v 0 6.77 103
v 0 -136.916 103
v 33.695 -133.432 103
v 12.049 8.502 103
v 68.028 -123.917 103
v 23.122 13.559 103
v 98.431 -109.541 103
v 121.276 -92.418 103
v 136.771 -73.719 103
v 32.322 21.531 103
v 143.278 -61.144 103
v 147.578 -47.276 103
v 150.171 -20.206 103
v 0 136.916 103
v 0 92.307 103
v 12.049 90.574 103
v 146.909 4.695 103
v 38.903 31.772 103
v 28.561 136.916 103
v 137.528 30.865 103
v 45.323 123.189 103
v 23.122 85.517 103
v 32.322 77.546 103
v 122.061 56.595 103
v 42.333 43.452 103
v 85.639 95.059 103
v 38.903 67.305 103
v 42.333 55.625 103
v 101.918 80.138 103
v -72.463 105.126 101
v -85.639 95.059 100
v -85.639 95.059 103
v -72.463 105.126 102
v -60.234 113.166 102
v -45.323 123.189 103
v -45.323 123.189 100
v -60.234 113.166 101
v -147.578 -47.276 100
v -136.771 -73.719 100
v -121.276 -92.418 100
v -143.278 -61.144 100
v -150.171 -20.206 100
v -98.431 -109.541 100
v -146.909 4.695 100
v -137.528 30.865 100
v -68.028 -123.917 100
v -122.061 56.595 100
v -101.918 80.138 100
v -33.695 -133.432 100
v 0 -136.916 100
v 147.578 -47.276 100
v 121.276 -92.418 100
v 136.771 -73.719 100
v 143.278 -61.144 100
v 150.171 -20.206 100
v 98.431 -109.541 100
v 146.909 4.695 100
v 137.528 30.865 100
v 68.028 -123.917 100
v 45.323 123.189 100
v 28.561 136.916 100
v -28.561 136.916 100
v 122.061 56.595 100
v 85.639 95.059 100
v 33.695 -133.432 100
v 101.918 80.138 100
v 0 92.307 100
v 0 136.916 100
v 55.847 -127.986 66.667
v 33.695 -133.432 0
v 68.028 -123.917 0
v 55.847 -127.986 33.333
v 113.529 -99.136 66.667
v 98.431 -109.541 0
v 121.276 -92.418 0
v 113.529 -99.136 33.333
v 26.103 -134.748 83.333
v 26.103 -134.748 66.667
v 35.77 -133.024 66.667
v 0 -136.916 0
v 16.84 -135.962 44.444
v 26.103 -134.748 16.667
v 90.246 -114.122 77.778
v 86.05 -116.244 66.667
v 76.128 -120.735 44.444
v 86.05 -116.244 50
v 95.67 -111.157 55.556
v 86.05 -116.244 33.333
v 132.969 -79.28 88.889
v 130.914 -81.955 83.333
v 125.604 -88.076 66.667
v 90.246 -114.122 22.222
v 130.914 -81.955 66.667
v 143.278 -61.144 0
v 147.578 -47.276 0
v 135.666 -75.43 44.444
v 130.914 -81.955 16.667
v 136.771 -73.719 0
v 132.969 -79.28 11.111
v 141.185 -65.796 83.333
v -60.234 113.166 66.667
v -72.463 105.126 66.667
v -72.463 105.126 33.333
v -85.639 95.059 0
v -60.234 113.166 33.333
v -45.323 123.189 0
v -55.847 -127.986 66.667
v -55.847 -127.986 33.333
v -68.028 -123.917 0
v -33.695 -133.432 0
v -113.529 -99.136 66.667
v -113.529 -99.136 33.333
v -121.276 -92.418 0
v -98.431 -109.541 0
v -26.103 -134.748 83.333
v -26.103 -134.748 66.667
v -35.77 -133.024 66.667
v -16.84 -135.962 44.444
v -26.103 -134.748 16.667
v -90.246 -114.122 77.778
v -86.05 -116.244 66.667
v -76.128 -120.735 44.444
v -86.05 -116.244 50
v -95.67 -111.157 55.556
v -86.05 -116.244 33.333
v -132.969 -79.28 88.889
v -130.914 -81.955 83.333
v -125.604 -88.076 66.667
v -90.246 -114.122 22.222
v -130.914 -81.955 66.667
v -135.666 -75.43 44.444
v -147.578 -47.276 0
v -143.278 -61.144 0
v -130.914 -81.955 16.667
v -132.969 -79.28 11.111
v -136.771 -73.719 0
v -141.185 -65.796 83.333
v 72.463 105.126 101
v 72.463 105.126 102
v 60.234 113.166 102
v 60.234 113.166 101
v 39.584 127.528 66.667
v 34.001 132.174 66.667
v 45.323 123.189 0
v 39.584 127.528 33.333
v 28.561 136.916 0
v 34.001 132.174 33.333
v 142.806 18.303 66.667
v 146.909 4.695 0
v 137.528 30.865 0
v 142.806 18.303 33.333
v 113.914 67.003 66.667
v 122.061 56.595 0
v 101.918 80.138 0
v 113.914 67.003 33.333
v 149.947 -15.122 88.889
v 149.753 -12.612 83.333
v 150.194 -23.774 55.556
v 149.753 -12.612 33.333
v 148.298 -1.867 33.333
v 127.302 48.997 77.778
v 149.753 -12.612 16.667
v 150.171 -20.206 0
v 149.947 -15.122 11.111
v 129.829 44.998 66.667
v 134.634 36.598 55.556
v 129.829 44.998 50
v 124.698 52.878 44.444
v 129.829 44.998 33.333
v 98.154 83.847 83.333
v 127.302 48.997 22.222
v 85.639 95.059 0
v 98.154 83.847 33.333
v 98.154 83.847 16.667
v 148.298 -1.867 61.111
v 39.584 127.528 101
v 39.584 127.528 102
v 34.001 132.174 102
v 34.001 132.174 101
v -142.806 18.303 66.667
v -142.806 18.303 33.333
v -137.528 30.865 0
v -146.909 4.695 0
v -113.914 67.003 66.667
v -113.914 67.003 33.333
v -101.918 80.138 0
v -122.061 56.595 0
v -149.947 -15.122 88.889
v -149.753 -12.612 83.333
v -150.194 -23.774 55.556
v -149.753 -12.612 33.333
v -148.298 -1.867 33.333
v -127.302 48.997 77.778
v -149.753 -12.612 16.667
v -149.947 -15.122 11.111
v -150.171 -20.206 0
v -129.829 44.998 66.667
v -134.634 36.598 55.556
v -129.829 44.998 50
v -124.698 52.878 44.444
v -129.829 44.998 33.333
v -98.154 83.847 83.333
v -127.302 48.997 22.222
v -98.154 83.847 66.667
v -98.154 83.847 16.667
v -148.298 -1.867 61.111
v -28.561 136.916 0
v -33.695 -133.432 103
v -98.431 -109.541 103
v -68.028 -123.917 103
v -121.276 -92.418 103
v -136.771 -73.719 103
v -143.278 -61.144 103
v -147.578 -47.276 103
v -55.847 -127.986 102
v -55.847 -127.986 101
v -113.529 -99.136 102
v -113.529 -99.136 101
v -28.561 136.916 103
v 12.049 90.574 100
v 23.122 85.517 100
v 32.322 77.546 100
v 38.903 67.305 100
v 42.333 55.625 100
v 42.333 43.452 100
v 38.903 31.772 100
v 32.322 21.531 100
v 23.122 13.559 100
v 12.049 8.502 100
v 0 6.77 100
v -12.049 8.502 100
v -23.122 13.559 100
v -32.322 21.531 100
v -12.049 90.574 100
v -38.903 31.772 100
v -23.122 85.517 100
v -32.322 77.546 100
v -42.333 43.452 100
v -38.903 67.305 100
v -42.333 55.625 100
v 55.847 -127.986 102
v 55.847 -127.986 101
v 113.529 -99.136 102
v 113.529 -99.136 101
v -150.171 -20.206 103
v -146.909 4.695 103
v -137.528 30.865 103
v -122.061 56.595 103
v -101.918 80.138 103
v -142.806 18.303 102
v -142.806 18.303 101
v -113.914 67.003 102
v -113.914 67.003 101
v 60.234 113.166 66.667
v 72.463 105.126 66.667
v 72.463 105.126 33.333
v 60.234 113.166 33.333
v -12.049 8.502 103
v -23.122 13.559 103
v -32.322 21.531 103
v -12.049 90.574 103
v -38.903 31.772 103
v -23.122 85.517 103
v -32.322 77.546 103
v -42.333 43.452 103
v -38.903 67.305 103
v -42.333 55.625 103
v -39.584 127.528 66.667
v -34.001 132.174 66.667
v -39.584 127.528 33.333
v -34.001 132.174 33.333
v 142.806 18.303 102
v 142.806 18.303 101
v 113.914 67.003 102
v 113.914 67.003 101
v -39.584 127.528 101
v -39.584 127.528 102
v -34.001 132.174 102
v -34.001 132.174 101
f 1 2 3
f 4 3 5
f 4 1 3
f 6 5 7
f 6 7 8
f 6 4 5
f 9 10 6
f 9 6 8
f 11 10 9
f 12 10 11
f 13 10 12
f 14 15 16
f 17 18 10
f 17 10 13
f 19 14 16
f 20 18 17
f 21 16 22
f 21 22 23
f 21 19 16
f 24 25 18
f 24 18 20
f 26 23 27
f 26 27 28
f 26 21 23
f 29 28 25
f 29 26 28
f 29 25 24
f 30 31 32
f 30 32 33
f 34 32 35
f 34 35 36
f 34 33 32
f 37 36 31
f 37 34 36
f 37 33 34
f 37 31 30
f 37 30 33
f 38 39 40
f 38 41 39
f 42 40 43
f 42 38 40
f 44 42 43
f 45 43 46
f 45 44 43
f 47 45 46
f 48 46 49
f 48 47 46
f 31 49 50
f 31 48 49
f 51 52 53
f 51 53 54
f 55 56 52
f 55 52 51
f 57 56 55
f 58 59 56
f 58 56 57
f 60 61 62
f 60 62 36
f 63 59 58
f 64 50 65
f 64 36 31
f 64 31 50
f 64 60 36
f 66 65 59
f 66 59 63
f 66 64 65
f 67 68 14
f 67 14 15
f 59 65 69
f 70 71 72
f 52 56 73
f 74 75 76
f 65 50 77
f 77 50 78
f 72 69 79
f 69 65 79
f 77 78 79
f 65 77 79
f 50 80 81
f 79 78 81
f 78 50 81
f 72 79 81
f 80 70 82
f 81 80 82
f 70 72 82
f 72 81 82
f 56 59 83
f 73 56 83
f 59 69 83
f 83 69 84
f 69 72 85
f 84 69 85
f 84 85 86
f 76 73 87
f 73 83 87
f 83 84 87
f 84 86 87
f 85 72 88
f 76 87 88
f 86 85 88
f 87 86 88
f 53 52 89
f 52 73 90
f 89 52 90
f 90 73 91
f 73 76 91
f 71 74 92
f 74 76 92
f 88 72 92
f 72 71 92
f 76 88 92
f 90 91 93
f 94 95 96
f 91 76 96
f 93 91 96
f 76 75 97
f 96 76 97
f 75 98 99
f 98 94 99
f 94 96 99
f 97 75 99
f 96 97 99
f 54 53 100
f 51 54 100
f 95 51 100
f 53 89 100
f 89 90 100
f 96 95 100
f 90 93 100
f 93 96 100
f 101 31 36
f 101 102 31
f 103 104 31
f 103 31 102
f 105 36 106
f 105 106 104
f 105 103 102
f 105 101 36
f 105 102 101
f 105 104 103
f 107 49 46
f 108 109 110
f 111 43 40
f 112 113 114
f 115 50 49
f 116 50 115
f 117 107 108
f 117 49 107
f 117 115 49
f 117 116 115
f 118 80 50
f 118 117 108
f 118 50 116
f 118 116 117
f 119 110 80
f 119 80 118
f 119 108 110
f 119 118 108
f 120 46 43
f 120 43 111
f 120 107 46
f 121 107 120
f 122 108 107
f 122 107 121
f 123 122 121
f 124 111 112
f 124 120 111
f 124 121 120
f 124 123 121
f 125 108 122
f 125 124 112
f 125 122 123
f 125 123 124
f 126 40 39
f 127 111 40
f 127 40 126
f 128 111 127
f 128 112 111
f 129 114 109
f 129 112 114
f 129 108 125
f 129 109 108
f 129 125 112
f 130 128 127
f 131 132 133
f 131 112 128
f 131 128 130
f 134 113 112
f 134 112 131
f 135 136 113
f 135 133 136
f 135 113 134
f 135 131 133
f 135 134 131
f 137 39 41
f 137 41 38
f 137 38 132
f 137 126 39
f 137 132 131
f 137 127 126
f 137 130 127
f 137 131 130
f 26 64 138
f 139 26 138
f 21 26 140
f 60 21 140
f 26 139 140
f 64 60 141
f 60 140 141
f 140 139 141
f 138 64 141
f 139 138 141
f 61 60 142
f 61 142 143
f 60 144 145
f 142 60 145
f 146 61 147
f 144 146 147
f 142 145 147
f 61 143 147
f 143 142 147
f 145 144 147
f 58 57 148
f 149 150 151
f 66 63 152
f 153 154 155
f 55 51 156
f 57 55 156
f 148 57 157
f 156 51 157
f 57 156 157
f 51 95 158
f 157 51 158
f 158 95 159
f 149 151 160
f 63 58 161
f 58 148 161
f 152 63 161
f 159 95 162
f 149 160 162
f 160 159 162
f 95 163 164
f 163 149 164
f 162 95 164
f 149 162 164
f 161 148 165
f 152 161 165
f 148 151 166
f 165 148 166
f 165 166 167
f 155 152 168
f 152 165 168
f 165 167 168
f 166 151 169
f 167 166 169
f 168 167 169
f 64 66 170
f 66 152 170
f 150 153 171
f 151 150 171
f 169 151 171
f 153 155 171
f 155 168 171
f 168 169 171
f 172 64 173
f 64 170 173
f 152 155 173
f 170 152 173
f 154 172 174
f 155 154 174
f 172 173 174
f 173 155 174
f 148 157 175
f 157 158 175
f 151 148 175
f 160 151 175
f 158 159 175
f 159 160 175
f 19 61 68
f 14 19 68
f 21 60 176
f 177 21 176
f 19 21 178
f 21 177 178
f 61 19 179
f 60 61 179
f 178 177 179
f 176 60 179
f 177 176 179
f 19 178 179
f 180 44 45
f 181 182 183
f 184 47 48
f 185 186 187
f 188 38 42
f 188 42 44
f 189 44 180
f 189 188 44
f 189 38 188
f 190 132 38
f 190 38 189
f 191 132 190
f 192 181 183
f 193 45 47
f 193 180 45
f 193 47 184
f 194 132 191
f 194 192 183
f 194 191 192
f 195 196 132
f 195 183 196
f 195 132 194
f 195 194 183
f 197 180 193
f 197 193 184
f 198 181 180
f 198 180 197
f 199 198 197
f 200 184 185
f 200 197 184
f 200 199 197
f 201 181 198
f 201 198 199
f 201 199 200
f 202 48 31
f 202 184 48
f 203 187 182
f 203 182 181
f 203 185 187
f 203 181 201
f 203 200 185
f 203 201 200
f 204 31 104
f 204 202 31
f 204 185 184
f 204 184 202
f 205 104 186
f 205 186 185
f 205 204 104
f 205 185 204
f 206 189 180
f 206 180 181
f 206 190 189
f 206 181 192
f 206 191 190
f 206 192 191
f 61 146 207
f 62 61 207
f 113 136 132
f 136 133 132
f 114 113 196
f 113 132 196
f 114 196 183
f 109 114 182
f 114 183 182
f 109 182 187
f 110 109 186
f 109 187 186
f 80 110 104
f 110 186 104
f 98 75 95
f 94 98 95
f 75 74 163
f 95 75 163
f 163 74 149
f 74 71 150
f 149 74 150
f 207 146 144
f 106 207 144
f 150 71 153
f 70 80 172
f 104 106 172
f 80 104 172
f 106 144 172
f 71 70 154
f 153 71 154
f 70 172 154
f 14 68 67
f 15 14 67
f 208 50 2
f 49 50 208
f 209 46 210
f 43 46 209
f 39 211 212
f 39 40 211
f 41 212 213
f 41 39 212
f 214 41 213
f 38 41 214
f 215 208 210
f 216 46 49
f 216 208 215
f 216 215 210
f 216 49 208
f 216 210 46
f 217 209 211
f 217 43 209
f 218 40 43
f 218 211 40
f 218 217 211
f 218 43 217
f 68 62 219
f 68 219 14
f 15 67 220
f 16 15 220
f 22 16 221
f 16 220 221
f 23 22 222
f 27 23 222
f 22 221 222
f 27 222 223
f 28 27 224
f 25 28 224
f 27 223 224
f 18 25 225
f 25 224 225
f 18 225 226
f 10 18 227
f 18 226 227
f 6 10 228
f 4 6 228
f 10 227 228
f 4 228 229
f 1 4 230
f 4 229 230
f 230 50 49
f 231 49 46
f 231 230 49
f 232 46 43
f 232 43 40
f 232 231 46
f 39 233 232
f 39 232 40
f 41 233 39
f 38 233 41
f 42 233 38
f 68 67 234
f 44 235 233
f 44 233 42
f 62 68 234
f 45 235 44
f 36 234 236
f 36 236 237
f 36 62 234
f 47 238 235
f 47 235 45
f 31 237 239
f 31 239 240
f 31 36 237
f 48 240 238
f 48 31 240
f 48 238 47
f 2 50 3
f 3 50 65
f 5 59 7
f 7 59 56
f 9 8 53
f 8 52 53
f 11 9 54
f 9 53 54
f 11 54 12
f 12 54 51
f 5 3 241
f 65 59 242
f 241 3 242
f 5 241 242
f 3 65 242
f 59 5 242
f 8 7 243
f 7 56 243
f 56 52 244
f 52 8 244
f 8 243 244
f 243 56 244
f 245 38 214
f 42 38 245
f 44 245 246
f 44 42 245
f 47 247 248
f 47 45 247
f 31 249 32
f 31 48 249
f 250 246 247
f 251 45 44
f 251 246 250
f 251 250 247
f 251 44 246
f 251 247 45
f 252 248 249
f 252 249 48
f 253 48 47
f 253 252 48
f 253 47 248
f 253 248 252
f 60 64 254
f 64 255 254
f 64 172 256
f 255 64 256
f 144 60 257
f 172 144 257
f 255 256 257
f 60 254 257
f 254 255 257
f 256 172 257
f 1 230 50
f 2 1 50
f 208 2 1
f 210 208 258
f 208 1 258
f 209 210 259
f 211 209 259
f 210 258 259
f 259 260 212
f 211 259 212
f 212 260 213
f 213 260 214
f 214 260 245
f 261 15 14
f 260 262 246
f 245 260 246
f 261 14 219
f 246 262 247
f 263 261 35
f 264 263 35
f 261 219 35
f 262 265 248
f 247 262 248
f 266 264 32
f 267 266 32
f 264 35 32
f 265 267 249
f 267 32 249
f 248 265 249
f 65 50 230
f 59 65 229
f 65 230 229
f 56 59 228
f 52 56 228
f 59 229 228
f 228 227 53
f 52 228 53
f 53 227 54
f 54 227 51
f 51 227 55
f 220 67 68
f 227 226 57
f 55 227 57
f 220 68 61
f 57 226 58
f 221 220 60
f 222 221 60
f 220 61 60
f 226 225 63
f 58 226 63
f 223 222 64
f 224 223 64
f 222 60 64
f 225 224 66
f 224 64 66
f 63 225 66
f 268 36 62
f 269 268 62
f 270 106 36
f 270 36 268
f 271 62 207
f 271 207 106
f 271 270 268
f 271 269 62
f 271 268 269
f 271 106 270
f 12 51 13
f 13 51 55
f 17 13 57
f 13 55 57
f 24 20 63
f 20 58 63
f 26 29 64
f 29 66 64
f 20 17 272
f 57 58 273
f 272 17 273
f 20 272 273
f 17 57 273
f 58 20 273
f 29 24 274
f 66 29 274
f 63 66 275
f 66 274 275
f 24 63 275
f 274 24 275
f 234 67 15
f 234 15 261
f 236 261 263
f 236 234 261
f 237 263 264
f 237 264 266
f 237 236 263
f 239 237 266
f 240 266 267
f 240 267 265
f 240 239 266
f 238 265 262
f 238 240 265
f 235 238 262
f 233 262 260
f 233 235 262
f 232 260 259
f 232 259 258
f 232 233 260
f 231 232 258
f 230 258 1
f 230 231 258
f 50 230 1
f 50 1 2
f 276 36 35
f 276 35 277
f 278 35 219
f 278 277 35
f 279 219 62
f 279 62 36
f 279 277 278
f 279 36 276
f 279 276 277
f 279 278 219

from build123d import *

# Parameters (mm, degrees)
SALIENTE_EXTRUIR1_DEPTH = 100
SALIENTE_EXTRUIR2_DEPTH = 100
SALIENTE_EXTRUIR6_DEPTH = 3
SALIENTE_EXTRUIR7_DEPTH = 3


with BuildPart() as part:
    # Croquis1 → Saliente-Extruir1 (new body)
    with BuildSketch(Plane.XY):
        with BuildLine():
            Line((-28.560802162, 136.916395712), (2.54e-07, 136.916395712))
            Line((2.54e-07, 136.916395712), (2.54e-07, -136.916395712))
            add(Edge.make_bspline(
                [(2.54e-07, -136.916395712), (-46.441340442, -136.916395602), (-133.83340639, -111.670406771), (-147.578497366, -47.27649641)],
                knots=[0, 0, 0, 0, 1, 1, 1, 1], degree=3))
            add(Edge.make_bspline(
                [(-147.578497366, -47.27649641), (-163.110192587, 25.487257565), (-105.360717743, 78.580885367), (-85.639397682, 95.058759336)],
                knots=[0, 0, 0, 0, 1, 1, 1, 1], degree=3))
            add(Edge.make_bspline(
                [(-85.639397682, 95.058759336), (-70.778695882, 107.475422336), (-62.78576597, 110.83954464), (-45.323206026, 123.188624336)],
                knots=[0, 0, 0, 0, 1, 1, 1, 1], degree=3))
            add(Edge.make_bspline(
                [(-45.323206026, 123.188624336), (-39.50234289, 127.304974752), (-33.933522938, 132.194713512), (-28.560802162, 136.916395712)],
                knots=[0, 0, 0, 0, 1, 1, 1, 1], degree=3))
        make_face()
    extrude(amount=SALIENTE_EXTRUIR1_DEPTH)

    # Croquis3 → Saliente-Extruir2 (add)
    with BuildSketch(Plane.XY):
        with BuildLine():
            Line((2.54e-07, 136.916395712), (0, -136.916395712))
            add(Edge.make_bspline(
                [(0, -136.916395712), (46.441340696, -136.916395629), (133.833406659, -111.67040685), (147.578497673, -47.276496498)],
                knots=[0, 0, 0, 0, 1, 1, 1, 1], degree=3))
            add(Edge.make_bspline(
                [(147.578497673, -47.276496498), (163.110192997, 25.487257456), (105.360718228, 78.58088534), (85.63939819, 95.058759336)],
                knots=[0, 0, 0, 0, 1, 1, 1, 1], degree=3))
            add(Edge.make_bspline(
                [(85.63939819, 95.058759336), (70.77869639, 107.475422336), (62.785766478, 110.83954464), (45.323206534, 123.188624336)],
                knots=[0, 0, 0, 0, 1, 1, 1, 1], degree=3))
            add(Edge.make_bspline(
                [(45.323206534, 123.188624336), (39.502343398, 127.304974752), (33.933523446, 132.194713512), (28.56080267, 136.916395712)],
                knots=[0, 0, 0, 0, 1, 1, 1, 1], degree=3))
            Line((28.56080267, 136.916395712), (2.54e-07, 136.916395712))
        make_face()
    extrude(amount=SALIENTE_EXTRUIR2_DEPTH)


with BuildPart() as body_2:
    # Croquis10 → Saliente-Extruir6 (new body)
    with BuildSketch(Plane.XY.offset(100)):
        with BuildLine():
            Line((-28.560802162, 136.916395712), (2.54e-07, 136.916395712))
            Line((2.54e-07, 136.916395712), (2.54e-07, 92.306545302))
            ThreePointArc((2.54e-07, 92.306545302), (-42.768313835, 49.538231213), (2.54e-07, 6.769917124))
            Line((2.54e-07, 6.769917124), (2.54e-07, -136.916395712))
            add(Edge.make_bspline(
                [(2.54e-07, -136.916395712), (-46.441340442, -136.916395602), (-133.83340639, -111.670406771), (-147.578497366, -47.27649641)],
                knots=[0, 0, 0, 0, 1, 1, 1, 1], degree=3))
            add(Edge.make_bspline(
                [(-147.578497366, -47.27649641), (-163.110192587, 25.487257565), (-105.360717743, 78.580885367), (-85.639397682, 95.058759336)],
                knots=[0, 0, 0, 0, 1, 1, 1, 1], degree=3))
            add(Edge.make_bspline(
                [(-85.639397682, 95.058759336), (-70.778695882, 107.475422336), (-62.78576597, 110.83954464), (-45.323206026, 123.188624336)],
                knots=[0, 0, 0, 0, 1, 1, 1, 1], degree=3))
            add(Edge.make_bspline(
                [(-45.323206026, 123.188624336), (-39.50234289, 127.304974752), (-33.933522938, 132.194713512), (-28.560802162, 136.916395712)],
                knots=[0, 0, 0, 0, 1, 1, 1, 1], degree=3))
        make_face()
    extrude(amount=SALIENTE_EXTRUIR6_DEPTH)


with BuildPart() as body_3:
    # Croquis8 → Saliente-Extruir7 (new body)
    with BuildSketch(Plane.XY.offset(100)):
        with BuildLine():
            Line((2.54e-07, 6.769917124), (2.54e-07, -136.916395712))
            add(Edge.make_bspline(
                [(2.54e-07, -136.916395712), (46.44134095, -136.916395602), (133.833406898, -111.670406771), (147.578497874, -47.27649641)],
                knots=[0, 0, 0, 0, 1, 1, 1, 1], degree=3))
            add(Edge.make_bspline(
                [(147.578497874, -47.27649641), (163.110193095, 25.487257565), (105.360718251, 78.580885367), (85.63939819, 95.058759336)],
                knots=[0, 0, 0, 0, 1, 1, 1, 1], degree=3))
            add(Edge.make_bspline(
                [(85.63939819, 95.058759336), (70.77869639, 107.475422336), (62.785766478, 110.83954464), (45.323206534, 123.188624336)],
                knots=[0, 0, 0, 0, 1, 1, 1, 1], degree=3))
            add(Edge.make_bspline(
                [(45.323206534, 123.188624336), (39.502343398, 127.304974752), (33.933523446, 132.194713512), (28.56080267, 136.916395712)],
                knots=[0, 0, 0, 0, 1, 1, 1, 1], degree=3))
            Line((28.56080267, 136.916395712), (2.54e-07, 136.916395712))
            Line((2.54e-07, 136.916395712), (2.54e-07, 92.306545302))
            ThreePointArc((2.54e-07, 92.306545302), (42.768314343, 49.538231213), (2.54e-07, 6.769917124))
        make_face()
    extrude(amount=SALIENTE_EXTRUIR7_DEPTH)


solid = Compound([part.part, body_2.part, body_3.part])
